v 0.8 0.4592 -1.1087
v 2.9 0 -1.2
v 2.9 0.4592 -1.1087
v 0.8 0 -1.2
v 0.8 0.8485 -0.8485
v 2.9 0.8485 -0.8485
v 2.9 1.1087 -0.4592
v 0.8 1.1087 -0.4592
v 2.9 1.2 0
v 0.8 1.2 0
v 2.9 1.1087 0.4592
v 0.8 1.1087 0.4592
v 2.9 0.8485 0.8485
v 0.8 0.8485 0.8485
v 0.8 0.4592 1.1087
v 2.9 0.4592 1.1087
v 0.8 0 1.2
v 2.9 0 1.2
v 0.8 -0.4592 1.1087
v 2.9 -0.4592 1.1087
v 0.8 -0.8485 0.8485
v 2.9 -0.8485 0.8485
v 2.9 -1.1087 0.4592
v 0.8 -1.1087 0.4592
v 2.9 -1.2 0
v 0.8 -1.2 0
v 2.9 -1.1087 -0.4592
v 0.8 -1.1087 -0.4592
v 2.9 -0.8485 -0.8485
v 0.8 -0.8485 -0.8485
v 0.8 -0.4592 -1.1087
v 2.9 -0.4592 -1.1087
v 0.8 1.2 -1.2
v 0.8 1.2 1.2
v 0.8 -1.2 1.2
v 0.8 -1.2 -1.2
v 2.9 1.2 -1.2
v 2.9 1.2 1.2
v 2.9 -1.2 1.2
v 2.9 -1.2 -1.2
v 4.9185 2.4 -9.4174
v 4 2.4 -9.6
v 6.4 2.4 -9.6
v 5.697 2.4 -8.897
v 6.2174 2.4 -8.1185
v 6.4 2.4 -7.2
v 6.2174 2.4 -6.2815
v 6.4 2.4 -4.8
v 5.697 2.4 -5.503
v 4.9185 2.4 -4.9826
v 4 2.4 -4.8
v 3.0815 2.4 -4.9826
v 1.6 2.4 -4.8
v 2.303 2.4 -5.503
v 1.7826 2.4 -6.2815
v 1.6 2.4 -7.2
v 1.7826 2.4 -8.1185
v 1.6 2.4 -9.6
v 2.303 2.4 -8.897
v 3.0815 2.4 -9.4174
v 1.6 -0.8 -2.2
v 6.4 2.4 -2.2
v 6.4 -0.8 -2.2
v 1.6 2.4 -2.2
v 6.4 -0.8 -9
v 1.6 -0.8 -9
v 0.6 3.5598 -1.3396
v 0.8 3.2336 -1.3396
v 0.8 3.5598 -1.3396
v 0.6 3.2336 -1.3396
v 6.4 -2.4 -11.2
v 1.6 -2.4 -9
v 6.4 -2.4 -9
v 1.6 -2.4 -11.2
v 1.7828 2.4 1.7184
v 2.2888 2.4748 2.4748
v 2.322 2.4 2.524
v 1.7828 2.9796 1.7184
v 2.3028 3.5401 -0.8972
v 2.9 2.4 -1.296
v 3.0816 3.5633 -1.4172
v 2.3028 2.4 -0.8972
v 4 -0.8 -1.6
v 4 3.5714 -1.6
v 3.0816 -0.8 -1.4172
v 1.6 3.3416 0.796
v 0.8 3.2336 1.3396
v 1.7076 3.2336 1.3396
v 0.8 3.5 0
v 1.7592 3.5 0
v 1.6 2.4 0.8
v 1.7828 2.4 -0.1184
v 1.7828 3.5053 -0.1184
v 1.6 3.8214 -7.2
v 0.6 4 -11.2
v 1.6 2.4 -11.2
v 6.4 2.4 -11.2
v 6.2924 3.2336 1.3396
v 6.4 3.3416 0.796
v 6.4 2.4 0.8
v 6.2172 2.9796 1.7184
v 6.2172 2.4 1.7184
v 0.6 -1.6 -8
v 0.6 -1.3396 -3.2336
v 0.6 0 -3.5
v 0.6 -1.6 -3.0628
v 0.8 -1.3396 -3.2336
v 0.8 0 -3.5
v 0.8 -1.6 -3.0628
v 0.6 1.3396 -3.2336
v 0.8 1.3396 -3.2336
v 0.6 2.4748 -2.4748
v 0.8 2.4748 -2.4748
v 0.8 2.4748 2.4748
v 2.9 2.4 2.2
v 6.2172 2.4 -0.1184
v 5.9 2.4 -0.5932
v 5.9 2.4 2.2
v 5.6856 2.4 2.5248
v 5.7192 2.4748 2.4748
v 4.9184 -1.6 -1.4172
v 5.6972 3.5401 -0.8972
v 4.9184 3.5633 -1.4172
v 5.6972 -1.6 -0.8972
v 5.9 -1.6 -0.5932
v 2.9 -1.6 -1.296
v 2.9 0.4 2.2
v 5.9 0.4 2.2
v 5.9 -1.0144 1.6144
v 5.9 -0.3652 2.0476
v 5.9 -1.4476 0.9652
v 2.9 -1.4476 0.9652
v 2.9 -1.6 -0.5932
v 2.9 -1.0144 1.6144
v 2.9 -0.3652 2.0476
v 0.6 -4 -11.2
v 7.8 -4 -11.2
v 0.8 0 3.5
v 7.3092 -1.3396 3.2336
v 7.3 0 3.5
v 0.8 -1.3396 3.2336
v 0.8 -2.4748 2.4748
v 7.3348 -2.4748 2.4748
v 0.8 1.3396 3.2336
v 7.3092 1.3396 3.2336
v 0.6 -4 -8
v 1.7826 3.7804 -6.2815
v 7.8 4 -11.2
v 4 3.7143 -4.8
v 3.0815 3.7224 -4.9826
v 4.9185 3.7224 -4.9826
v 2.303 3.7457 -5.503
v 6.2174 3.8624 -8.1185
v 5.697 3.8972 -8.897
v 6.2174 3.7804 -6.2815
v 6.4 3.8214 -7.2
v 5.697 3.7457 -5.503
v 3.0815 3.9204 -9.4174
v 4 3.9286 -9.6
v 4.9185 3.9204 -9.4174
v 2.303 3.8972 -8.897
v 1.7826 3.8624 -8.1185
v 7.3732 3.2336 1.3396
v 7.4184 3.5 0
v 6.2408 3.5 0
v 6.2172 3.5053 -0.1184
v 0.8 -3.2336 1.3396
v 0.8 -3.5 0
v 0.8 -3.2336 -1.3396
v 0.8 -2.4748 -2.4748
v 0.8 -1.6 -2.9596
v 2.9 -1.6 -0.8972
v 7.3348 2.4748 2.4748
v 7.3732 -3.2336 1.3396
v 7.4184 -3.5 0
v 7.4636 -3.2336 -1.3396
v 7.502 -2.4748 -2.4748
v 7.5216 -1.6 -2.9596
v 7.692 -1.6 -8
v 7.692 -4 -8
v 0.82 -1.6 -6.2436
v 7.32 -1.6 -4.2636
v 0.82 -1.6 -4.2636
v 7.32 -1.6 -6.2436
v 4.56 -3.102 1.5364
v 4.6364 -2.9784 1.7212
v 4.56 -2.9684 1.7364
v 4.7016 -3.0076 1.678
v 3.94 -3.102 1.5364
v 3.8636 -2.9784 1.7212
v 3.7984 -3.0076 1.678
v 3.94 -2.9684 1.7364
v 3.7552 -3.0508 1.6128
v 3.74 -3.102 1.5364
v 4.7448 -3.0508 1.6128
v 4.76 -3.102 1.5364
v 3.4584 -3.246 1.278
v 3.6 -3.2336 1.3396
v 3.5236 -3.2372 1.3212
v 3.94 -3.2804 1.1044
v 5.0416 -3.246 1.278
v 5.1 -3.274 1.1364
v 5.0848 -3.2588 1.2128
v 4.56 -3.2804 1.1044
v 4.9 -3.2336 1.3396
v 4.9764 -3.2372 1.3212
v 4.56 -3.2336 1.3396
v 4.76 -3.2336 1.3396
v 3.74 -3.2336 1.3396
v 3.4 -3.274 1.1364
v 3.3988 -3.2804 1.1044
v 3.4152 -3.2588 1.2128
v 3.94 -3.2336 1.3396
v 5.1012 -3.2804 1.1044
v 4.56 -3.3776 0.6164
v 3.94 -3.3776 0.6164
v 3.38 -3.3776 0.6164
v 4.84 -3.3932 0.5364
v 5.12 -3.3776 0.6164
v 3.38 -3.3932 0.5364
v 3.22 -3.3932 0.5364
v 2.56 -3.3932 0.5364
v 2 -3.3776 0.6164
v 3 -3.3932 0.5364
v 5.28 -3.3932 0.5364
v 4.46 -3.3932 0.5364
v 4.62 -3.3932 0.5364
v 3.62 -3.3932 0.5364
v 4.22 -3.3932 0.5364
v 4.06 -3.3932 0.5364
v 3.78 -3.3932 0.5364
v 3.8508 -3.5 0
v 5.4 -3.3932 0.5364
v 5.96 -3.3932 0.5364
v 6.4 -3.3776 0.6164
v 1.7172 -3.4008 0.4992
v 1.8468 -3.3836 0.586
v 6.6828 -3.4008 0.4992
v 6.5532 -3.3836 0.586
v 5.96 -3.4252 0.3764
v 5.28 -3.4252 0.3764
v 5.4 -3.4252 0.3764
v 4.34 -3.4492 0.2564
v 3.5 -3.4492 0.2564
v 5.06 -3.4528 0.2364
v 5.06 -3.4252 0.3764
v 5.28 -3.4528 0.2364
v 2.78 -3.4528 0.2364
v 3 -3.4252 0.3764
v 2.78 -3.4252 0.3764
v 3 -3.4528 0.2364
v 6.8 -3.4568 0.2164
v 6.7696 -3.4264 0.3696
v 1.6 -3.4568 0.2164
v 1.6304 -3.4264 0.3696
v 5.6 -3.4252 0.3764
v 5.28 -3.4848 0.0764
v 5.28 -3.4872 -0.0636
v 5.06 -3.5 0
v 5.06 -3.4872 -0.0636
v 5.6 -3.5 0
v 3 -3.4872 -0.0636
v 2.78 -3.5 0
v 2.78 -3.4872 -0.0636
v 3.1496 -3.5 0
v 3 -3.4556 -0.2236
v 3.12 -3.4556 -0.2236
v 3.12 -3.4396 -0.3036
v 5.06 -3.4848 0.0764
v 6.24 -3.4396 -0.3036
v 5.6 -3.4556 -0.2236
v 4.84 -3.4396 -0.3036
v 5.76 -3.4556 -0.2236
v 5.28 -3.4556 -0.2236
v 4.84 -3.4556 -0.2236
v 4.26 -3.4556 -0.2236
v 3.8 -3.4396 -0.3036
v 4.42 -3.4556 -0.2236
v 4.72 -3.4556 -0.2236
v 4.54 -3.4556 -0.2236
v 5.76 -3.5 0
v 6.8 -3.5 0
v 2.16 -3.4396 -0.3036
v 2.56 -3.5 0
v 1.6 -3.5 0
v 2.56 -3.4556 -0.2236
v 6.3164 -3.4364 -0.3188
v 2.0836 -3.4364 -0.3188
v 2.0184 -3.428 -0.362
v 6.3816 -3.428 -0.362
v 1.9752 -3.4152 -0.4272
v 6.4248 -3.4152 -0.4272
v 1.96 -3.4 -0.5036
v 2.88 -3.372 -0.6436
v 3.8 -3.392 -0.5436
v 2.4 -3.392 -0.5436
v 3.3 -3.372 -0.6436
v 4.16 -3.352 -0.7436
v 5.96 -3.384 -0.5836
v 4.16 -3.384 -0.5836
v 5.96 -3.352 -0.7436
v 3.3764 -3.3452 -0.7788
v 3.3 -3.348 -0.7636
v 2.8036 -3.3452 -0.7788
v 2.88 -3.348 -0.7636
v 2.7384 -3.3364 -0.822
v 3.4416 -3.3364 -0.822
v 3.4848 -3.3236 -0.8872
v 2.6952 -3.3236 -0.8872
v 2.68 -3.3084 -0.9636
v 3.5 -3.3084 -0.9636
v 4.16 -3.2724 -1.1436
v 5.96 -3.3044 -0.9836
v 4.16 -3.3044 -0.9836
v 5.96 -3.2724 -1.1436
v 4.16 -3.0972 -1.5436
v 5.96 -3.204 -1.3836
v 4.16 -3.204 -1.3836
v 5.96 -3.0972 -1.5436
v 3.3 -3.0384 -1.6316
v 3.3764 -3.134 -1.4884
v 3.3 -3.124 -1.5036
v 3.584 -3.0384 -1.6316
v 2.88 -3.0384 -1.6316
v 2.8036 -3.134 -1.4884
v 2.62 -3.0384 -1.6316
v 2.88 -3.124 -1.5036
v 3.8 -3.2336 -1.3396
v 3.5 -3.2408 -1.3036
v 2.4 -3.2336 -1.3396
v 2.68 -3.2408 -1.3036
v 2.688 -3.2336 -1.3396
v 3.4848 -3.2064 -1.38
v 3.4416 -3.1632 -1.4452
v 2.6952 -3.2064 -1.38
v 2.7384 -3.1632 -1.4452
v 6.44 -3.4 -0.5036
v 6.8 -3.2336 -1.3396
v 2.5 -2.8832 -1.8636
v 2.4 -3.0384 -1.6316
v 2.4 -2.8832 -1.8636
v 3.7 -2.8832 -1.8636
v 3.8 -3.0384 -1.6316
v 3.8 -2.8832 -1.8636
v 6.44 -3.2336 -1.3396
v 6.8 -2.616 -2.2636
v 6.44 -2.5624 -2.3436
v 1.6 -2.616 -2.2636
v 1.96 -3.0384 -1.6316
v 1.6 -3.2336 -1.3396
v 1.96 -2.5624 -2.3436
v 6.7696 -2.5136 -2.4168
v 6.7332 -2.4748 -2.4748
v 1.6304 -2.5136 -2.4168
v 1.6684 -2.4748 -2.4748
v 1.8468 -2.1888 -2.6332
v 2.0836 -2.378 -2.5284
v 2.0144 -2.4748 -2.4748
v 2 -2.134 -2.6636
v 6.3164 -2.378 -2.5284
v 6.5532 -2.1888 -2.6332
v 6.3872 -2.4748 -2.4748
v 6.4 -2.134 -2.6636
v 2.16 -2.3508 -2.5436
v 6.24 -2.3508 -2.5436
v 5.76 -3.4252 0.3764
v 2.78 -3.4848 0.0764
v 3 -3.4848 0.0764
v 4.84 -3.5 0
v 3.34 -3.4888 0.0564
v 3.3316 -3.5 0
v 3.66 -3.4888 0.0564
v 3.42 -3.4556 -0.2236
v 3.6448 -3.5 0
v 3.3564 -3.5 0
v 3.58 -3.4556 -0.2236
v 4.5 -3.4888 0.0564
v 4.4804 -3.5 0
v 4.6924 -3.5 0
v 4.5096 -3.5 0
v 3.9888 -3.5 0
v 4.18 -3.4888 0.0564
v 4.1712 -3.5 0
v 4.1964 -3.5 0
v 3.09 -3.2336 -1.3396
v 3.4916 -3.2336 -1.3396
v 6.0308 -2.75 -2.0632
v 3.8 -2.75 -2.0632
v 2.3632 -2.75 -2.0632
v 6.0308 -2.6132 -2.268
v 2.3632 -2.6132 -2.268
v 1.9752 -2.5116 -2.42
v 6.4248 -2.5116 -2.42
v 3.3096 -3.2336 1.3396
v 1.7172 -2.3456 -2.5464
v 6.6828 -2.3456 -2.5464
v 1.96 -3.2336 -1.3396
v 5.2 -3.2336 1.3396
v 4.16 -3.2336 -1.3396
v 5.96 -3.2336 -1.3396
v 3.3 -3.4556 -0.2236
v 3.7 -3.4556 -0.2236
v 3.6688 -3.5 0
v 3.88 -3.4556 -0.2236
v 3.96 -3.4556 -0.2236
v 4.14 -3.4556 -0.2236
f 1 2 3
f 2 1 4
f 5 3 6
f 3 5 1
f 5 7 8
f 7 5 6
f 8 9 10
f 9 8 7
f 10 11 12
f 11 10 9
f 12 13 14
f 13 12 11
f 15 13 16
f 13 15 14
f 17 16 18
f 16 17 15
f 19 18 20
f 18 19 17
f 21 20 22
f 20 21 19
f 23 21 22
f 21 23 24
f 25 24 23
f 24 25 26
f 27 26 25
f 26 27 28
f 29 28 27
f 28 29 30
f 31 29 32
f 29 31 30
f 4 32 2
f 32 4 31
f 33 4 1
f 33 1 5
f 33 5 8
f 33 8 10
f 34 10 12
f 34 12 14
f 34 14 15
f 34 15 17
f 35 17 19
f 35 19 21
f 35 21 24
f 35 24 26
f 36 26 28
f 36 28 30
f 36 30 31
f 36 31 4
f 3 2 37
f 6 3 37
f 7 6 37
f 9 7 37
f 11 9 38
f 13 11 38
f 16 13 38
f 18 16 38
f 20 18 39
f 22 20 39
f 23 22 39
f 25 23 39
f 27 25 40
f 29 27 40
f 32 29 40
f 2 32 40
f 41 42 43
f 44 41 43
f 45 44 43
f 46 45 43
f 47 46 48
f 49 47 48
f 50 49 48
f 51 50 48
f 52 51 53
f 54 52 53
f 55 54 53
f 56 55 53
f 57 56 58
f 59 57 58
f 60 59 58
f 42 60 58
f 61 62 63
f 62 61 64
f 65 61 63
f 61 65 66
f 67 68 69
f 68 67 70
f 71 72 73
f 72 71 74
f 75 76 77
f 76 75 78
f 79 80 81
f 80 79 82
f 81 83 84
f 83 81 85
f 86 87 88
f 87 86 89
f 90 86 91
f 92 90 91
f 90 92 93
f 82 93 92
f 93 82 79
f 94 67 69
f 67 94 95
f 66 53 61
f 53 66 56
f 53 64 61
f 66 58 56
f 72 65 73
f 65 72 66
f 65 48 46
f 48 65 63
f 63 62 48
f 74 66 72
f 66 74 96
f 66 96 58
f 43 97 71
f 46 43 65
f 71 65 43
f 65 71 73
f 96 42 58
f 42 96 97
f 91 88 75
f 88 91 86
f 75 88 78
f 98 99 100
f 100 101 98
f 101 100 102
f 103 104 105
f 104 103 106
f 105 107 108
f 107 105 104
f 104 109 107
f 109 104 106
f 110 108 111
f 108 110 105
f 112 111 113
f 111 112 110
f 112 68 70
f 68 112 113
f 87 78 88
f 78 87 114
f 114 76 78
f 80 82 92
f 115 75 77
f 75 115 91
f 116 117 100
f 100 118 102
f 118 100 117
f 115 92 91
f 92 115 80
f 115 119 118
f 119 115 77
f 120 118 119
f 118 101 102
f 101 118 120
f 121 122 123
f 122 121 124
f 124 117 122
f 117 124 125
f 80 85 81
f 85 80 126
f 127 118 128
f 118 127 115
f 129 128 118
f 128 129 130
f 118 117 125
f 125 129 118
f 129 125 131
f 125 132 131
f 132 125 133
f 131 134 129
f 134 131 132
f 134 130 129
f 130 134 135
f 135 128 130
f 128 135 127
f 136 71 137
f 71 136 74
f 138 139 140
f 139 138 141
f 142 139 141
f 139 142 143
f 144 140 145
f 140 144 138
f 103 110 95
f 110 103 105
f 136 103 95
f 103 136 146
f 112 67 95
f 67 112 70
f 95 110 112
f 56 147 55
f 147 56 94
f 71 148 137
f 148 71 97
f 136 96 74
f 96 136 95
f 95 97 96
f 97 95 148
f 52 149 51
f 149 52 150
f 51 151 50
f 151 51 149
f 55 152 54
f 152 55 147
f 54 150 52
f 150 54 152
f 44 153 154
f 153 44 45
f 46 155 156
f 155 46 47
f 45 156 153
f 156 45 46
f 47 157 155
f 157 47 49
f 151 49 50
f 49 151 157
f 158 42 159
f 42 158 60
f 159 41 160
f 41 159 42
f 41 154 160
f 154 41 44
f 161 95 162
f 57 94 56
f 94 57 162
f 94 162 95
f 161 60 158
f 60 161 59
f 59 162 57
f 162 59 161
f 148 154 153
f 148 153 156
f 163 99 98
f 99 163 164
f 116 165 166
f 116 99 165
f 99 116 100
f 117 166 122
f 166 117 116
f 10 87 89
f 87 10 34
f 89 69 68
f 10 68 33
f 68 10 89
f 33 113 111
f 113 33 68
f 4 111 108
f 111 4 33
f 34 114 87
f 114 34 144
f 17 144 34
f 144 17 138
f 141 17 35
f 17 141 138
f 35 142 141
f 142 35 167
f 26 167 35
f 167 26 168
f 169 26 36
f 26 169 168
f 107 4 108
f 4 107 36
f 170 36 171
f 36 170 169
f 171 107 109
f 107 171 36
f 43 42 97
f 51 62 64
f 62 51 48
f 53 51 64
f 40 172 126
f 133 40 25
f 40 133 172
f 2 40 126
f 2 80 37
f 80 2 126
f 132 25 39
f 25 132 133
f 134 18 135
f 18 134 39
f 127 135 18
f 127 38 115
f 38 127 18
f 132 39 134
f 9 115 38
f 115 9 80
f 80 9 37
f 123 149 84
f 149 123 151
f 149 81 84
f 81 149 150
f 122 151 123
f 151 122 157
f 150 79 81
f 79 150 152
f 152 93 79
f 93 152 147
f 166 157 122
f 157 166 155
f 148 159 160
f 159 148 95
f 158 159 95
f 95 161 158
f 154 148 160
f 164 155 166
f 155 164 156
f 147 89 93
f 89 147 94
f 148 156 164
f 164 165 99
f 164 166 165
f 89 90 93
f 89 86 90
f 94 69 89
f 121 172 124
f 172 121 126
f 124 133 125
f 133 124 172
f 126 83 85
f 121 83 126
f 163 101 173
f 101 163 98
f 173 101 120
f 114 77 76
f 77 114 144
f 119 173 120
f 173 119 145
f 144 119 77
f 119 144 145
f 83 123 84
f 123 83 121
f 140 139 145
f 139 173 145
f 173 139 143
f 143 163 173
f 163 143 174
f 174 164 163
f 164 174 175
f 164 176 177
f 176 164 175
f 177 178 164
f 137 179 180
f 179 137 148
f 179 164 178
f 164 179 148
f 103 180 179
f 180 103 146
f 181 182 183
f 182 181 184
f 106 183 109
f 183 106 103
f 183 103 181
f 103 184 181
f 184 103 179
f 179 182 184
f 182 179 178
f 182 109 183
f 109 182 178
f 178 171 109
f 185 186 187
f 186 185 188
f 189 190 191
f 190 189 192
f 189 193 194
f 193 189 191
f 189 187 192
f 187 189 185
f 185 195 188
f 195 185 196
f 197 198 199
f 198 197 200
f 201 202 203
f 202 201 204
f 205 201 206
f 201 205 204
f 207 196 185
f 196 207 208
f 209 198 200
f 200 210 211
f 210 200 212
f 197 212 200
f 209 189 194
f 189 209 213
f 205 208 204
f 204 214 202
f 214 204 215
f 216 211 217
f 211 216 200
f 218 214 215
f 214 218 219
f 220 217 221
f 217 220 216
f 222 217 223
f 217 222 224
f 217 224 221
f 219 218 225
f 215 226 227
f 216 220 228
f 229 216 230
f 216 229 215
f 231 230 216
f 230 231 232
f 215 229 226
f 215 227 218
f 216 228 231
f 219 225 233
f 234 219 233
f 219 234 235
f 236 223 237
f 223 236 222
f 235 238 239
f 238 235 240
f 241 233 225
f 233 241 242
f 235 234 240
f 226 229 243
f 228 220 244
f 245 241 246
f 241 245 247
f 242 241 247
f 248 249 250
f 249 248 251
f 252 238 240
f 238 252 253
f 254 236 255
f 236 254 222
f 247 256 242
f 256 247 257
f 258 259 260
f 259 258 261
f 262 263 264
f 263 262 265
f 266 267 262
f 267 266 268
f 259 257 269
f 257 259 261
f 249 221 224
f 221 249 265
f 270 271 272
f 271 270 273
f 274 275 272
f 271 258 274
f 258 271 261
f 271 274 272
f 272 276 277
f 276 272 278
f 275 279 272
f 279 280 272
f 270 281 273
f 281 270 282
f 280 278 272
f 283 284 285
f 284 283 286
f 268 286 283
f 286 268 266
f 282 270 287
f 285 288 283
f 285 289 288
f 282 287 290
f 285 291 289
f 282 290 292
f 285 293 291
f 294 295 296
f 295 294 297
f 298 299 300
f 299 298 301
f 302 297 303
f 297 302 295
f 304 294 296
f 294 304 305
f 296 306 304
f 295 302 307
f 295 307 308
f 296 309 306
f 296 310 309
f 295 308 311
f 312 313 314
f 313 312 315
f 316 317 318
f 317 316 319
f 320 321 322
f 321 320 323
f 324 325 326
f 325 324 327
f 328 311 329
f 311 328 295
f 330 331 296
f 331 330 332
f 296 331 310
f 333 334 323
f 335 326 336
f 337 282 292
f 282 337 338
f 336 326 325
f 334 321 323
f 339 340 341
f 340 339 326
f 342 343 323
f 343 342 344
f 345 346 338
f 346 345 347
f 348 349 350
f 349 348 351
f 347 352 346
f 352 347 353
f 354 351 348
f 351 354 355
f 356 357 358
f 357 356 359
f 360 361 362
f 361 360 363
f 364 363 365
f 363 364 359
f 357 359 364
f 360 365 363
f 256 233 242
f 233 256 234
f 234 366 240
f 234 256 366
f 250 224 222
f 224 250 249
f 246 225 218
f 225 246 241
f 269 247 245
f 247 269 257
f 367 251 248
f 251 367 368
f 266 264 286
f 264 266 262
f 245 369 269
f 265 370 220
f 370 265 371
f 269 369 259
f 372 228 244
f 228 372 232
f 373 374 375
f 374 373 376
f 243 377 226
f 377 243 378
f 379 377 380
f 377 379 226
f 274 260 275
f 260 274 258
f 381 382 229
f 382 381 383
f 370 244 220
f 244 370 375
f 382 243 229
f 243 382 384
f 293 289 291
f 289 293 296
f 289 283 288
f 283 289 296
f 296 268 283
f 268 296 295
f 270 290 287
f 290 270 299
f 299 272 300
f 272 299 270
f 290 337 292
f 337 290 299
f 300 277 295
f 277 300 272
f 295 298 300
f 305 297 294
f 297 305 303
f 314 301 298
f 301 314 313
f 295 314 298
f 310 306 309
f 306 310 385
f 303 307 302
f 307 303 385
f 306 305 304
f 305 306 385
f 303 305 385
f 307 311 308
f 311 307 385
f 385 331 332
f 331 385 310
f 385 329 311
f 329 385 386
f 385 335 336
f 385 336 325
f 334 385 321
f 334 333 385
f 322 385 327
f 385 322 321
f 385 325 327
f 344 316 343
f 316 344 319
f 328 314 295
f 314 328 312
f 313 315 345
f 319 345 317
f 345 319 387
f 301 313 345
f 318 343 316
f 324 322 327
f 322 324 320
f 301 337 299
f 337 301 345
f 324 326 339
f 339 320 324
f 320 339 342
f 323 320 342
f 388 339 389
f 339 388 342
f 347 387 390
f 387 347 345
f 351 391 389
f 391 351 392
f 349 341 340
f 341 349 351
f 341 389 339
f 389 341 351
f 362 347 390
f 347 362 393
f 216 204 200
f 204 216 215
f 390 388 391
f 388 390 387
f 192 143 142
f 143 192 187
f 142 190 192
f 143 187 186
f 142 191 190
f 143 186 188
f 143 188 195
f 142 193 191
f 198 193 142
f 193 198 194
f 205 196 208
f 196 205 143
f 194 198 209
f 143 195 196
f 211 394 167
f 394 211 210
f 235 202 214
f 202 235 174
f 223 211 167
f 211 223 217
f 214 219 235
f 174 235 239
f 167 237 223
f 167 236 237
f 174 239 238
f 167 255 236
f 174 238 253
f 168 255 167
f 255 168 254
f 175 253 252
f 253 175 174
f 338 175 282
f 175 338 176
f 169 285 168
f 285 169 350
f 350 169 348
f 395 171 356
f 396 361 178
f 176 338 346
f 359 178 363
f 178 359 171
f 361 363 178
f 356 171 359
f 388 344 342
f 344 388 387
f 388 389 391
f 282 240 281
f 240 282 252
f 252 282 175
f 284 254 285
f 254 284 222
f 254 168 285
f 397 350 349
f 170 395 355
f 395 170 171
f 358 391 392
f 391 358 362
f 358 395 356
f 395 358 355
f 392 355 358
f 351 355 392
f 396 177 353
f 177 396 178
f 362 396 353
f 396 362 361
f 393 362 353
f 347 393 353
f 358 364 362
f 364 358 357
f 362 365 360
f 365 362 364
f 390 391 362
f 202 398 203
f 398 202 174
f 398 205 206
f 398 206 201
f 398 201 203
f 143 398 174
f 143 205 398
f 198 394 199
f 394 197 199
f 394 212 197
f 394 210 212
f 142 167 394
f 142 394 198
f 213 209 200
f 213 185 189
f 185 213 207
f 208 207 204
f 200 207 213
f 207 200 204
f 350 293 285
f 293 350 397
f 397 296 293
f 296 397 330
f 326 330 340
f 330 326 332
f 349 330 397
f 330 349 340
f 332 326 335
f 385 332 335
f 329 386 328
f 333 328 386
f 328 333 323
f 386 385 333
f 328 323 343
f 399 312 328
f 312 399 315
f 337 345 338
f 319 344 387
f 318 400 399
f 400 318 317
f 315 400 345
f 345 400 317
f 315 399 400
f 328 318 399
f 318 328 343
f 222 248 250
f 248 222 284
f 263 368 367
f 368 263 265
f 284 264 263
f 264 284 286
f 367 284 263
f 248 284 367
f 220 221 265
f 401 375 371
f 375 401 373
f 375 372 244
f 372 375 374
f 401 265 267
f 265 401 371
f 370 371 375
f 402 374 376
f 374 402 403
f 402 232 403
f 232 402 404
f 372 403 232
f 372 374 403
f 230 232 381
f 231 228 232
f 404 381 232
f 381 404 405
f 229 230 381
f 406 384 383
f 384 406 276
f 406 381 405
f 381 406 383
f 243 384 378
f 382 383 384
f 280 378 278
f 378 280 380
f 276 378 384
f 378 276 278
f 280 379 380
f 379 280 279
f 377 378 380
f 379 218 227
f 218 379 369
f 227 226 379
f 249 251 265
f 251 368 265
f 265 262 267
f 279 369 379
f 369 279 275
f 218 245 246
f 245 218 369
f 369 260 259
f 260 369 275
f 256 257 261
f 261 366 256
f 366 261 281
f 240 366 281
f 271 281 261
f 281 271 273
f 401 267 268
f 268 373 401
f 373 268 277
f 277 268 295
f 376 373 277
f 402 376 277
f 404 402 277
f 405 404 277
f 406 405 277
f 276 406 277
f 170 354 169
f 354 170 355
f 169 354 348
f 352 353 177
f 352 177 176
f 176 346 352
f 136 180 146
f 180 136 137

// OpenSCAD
use <../lib.scad>
use <s/3817bp8is01.scad>
use <s/3817bs01.scad>
function ldraw_lib__3817bp8h() = [
// 0 ~Minifig Leg Left with 'EMMET' Badge and Reflective Stripe Pattern (Obsolete)
// 0 Name: 3817bp8h.dat
// 0 Author: Chris Dee [cwdee]
// 0 !LDRAW_ORG Part UPDATE 2023-03
// 0 !LICENSE Licensed under CC BY 4.0 : see CAreadme.txt
// 
// 0 BFC CERTIFY CCW
  [0,"BFC","CERTIFY"],
  [0,"BFC","CCW"],
// 
// 0 !KEYWORDS Emmet, Set 70818
// 
// 0 !CMDLINE -c25
// 
// 0 !HISTORY 2015-10-27 [Christophe_Mitillo] Original pattern design
// 0 !HISTORY 2020-06-13 [cwdee] Adapted to corrected geometry
// 0 !HISTORY 2022-01-14 [PTadmin] Official Update 2022-01
// 0 !HISTORY 2023-05-21 [Holly-Wood] Obsoleted due to bad geometry
// 0 !HISTORY 2023-06-24 [OrionP] Official Update 2023-03
// 
// 
// 1 16 0 0 0 1 0 0 0 1 0 0 0 1 s\3817bs01.dat
  [1,16,0,0,0,1,0,0,0,1,0,0,0,1, ldraw_lib__s__3817bs01()],
// 0 // Foot Top
// 4 16 1.5 20 -4 1.5 20 -10 19.23 20 -10 19.23 20 -4
  [4,16,1.5,20,-4,1.5,20,-10,19.23,20,-10,19.23,20,-4],
// 0 // Curve and front pattern
// 1 16 0 0 0 1 0 0 0 1 0 0 0 1 s\3817bp8is01.dat
  [1,16,0,0,0,1,0,0,0,1,0,0,0,1, ldraw_lib__s__3817bp8is01()],
// 5 24 2 3.349 -8.084 18.659 3.349 -8.084 2 0 -8.75 2 6.187 -6.187
  [5,24,2,3.349,-8.084,18.659,3.349,-8.084,2,0,-8.75,2,6.187,-6.187],
// 5 24 2 6.187 -6.187 18.755 6.187 -6.187 2 7.399 -4 2 3.349 -8.084
  [5,24,2,6.187,-6.187,18.755,6.187,-6.187,2,7.399,-4,2,3.349,-8.084],
// 5 24 2 0 -8.75 18.546 0 -8.75 2 3.349 -8.084 2 -3.349 -8.084
  [5,24,2,0,-8.75,18.546,0,-8.75,2,3.349,-8.084,2,-3.349,-8.084],
// 5 24 2 -3.349 -8.084 18.433 -3.349 -8.084 2 0 -8.75 2 -6.187 -6.187
  [5,24,2,-3.349,-8.084,18.433,-3.349,-8.084,2,0,-8.75,2,-6.187,-6.187],
// 0 // Foot Front
// 4 16 19.5 28 -10 19.23 20 -10 1.5 20 -10 1.5 28 -10
  [4,16,19.5,28,-10,19.23,20,-10,1.5,20,-10,1.5,28,-10],
];
module ldraw_lib__3817bp8h(step=0, col=false, unit=2/5, alt=false, line=0.2, solid=!$preview)
    makepoly(ldraw_lib__3817bp8h(), step=step, col=col, unit=unit, alt=alt, line=line, solid=solid);
ldraw_lib__3817bp8h(line=0.2);
